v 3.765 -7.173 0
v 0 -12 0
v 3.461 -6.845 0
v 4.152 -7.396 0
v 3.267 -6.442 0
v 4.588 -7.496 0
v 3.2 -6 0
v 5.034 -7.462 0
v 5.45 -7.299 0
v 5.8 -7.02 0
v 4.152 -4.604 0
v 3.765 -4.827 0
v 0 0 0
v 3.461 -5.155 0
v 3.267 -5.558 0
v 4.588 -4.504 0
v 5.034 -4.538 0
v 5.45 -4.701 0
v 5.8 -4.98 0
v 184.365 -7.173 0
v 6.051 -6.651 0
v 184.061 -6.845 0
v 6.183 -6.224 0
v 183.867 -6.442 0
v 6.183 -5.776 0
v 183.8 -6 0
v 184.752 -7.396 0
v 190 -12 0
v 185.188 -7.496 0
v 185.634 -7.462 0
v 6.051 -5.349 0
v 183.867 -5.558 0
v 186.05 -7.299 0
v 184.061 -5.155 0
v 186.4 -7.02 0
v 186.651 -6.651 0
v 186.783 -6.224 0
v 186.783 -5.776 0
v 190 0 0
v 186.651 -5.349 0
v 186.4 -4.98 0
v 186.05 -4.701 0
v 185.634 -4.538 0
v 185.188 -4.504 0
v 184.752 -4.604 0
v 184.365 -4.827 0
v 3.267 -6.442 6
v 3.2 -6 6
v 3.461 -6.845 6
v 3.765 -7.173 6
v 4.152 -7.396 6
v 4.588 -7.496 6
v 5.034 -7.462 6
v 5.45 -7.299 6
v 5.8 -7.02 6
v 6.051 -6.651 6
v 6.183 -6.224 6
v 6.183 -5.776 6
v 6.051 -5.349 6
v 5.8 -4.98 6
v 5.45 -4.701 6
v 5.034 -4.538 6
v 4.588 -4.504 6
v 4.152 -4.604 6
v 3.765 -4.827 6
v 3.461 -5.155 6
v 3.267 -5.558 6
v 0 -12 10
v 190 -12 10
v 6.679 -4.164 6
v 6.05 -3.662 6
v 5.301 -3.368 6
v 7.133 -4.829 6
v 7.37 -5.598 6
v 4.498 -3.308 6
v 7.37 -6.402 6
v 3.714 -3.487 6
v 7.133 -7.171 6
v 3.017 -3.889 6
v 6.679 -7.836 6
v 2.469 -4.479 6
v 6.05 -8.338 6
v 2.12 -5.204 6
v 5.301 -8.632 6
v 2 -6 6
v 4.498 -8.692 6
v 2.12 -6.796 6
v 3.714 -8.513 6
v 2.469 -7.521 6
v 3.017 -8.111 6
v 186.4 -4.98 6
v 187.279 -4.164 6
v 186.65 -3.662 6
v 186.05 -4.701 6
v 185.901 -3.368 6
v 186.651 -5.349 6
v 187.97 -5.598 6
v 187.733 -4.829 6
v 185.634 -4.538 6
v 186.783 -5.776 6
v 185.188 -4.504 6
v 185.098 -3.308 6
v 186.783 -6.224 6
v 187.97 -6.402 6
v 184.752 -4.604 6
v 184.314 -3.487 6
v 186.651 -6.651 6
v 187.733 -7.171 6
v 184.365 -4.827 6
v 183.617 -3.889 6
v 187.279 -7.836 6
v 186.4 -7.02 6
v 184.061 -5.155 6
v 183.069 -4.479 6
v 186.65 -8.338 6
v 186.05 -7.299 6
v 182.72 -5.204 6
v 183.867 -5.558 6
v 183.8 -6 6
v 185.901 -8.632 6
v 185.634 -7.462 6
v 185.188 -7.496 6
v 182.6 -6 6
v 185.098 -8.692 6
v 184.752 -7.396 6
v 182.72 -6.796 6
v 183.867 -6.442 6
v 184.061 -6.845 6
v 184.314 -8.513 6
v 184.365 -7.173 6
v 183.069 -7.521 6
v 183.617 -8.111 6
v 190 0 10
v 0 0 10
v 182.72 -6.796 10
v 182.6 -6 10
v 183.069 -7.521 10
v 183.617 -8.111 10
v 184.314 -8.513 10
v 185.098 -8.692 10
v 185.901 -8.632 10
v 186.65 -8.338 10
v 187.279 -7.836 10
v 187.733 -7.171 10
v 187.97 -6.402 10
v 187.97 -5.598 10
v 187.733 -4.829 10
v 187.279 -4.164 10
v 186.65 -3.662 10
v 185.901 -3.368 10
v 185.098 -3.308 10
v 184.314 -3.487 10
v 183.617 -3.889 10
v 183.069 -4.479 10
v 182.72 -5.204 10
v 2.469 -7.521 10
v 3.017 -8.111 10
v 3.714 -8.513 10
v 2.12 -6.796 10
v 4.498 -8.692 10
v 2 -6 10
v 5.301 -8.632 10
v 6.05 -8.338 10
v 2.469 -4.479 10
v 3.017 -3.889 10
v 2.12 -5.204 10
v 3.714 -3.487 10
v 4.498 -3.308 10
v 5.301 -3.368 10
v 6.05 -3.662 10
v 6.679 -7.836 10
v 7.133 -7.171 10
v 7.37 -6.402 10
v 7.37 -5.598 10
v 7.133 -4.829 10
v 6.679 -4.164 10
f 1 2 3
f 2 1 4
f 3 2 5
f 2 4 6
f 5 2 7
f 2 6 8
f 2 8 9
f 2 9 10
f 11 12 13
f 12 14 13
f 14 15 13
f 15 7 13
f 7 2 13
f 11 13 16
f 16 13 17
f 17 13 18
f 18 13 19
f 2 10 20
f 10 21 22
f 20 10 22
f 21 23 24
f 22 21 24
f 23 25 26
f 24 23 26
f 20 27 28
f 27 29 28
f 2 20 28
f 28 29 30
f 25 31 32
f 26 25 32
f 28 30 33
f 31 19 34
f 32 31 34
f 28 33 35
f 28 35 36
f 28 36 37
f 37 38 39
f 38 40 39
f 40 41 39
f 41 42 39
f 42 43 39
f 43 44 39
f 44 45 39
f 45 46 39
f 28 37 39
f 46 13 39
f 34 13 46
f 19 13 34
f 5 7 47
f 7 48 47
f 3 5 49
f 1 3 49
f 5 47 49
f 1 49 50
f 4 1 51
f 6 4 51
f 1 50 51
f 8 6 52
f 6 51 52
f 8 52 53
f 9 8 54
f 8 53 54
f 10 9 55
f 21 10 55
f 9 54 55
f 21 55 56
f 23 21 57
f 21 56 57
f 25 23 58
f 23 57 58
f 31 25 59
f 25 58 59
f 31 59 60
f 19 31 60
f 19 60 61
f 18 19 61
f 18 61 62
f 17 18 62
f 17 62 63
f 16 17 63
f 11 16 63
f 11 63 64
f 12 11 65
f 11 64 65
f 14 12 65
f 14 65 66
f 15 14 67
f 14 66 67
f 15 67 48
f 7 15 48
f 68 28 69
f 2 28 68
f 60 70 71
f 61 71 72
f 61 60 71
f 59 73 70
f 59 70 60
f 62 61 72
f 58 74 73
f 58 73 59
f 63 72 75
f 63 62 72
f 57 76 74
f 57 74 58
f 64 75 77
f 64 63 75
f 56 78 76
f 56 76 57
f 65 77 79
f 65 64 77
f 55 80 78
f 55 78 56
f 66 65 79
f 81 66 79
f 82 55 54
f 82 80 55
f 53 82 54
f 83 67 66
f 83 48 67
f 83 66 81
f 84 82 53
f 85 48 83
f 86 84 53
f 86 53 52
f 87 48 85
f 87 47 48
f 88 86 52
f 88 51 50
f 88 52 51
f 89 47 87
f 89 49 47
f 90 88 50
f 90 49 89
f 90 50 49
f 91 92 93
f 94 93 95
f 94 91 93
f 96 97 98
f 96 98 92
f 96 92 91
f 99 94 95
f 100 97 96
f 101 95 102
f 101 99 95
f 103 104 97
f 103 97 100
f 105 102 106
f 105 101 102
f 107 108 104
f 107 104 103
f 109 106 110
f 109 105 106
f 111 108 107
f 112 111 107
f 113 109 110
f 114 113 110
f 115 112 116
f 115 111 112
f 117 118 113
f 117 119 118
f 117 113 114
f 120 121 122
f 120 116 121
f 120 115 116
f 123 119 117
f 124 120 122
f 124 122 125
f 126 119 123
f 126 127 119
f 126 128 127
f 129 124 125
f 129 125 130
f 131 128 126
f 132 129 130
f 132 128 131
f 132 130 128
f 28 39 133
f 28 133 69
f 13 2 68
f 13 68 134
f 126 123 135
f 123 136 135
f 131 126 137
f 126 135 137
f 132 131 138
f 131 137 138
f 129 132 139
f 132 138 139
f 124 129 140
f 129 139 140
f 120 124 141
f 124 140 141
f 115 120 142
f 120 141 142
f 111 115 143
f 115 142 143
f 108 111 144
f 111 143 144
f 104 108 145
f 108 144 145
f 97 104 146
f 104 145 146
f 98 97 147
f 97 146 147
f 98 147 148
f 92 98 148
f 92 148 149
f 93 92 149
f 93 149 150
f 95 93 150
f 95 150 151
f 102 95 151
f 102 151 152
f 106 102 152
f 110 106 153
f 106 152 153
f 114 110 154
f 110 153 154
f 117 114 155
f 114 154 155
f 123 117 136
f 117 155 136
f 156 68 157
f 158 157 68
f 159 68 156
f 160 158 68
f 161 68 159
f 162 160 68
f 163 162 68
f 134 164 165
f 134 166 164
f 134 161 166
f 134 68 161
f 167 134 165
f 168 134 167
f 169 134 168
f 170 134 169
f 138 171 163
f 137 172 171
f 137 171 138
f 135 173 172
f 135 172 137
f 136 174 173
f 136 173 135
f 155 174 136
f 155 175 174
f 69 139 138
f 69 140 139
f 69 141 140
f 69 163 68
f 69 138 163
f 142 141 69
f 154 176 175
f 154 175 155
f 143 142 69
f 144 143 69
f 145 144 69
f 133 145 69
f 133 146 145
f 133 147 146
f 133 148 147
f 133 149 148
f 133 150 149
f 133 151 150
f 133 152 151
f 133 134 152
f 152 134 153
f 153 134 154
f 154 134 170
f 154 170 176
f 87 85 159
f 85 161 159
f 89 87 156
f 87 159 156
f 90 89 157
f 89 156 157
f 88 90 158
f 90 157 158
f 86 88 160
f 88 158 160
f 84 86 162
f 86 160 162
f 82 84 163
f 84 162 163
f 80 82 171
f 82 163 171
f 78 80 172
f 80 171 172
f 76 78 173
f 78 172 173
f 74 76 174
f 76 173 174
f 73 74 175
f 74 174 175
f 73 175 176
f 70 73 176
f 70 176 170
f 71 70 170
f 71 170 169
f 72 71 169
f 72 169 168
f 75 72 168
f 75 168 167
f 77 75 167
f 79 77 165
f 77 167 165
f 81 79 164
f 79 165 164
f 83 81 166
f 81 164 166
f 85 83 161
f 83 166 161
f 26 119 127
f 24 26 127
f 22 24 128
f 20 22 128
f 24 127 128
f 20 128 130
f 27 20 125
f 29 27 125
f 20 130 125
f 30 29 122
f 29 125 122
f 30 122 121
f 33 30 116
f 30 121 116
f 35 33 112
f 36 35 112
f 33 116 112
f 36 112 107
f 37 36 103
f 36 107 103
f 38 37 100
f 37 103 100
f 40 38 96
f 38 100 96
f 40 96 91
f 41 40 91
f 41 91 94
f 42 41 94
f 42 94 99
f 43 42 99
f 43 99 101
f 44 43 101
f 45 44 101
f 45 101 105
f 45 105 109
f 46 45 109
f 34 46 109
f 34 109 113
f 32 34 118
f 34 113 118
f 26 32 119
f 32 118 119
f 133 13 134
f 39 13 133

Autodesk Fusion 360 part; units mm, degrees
sketch "Sketch1" plane through (0, 0, 0) normal (0, 0, 1) x (1, 0, 0)
  line L0 (0, 0) -> (190, 0)
  line L1 (190, 0) -> (190, -12)
  line L2 (190, -12) -> (0, -12)
  line L3 (0, -12) -> (0, 0)
  dimension "d16" = 190
  dimension "d17" = 12
extrude "Extrude1" add sketch "Sketch1" along normal blind 10
sketch "Sketch6" plane through (0, 0, 10) normal (0, 0, 1) x (-1, 0, 0)
  line L0 (0, 12) -> (-190, 12)
  line L1 (-190, 12) -> (-190, 0)
  line L2 (-190, 0) -> (0, 0)
  line L3 (0, 0) -> (0, 12)
  circle A0 centre (-4.7, 6) radius 1.5
  circle A1 centre (-4.7, 6) radius 2.7
  circle A2 centre (-185.3, 6) radius 1.5
  circle A3 centre (-185.3, 6) radius 2.7
  line L4 (0, 12) -> (0, 0)
  line L5 (0, 0) -> (-190, 0)
  line L6 (-190, 0) -> (-190, 12)
  dimension "d65" = 3
  dimension "d66" = 1.2
  dimension "d67" = 3
  dimension "d68" = 1.2
  dimension "d69" = 4.7
  dimension "d70" = 6
  dimension "d71" = 4.7
  dimension "d72" = 6
extrude "Extrude9" cut sketch "Sketch6" against normal blind 100 contours A2
extrude "Extrude10" cut sketch "Sketch6" against normal blind 4 contours A3
extrude "Extrude11" cut sketch "Sketch6" against normal blind 100 contours A0
extrude "Extrude12" cut sketch "Sketch6" against normal blind 4 contours A1
equation "length = 190 mm"
equation "height = 10 mm"
equation "width = 12 mm"
equation "d16 = length"
equation "d17 = width"
equation "d18 = height"
equation "extra = 100 mm"
equation "bearing_outer_radius = 2.7 mm"
equation "bearing_width = 4 mm"
equation "bearing_big_distance = 2 mm + bearing_outer_radius"
equation "bearing_small_distance = width / 2"
equation "bearing_inner_radius = 1.5 mm"
equation "d65 = bearing_inner_radius * 2"
equation "d66 = bearing_outer_radius - bearing_inner_radius"
equation "d67 = bearing_inner_radius * 2"
equation "d68 = bearing_outer_radius - bearing_inner_radius"
equation "d69 = bearing_big_distance"
equation "d70 = bearing_small_distance"
equation "d71 = bearing_big_distance"
equation "d72 = bearing_small_distance"
equation "d73 = -extra"
equation "d75 = -bearing_width"
equation "d77 = -extra"
equation "d79 = -bearing_width"
